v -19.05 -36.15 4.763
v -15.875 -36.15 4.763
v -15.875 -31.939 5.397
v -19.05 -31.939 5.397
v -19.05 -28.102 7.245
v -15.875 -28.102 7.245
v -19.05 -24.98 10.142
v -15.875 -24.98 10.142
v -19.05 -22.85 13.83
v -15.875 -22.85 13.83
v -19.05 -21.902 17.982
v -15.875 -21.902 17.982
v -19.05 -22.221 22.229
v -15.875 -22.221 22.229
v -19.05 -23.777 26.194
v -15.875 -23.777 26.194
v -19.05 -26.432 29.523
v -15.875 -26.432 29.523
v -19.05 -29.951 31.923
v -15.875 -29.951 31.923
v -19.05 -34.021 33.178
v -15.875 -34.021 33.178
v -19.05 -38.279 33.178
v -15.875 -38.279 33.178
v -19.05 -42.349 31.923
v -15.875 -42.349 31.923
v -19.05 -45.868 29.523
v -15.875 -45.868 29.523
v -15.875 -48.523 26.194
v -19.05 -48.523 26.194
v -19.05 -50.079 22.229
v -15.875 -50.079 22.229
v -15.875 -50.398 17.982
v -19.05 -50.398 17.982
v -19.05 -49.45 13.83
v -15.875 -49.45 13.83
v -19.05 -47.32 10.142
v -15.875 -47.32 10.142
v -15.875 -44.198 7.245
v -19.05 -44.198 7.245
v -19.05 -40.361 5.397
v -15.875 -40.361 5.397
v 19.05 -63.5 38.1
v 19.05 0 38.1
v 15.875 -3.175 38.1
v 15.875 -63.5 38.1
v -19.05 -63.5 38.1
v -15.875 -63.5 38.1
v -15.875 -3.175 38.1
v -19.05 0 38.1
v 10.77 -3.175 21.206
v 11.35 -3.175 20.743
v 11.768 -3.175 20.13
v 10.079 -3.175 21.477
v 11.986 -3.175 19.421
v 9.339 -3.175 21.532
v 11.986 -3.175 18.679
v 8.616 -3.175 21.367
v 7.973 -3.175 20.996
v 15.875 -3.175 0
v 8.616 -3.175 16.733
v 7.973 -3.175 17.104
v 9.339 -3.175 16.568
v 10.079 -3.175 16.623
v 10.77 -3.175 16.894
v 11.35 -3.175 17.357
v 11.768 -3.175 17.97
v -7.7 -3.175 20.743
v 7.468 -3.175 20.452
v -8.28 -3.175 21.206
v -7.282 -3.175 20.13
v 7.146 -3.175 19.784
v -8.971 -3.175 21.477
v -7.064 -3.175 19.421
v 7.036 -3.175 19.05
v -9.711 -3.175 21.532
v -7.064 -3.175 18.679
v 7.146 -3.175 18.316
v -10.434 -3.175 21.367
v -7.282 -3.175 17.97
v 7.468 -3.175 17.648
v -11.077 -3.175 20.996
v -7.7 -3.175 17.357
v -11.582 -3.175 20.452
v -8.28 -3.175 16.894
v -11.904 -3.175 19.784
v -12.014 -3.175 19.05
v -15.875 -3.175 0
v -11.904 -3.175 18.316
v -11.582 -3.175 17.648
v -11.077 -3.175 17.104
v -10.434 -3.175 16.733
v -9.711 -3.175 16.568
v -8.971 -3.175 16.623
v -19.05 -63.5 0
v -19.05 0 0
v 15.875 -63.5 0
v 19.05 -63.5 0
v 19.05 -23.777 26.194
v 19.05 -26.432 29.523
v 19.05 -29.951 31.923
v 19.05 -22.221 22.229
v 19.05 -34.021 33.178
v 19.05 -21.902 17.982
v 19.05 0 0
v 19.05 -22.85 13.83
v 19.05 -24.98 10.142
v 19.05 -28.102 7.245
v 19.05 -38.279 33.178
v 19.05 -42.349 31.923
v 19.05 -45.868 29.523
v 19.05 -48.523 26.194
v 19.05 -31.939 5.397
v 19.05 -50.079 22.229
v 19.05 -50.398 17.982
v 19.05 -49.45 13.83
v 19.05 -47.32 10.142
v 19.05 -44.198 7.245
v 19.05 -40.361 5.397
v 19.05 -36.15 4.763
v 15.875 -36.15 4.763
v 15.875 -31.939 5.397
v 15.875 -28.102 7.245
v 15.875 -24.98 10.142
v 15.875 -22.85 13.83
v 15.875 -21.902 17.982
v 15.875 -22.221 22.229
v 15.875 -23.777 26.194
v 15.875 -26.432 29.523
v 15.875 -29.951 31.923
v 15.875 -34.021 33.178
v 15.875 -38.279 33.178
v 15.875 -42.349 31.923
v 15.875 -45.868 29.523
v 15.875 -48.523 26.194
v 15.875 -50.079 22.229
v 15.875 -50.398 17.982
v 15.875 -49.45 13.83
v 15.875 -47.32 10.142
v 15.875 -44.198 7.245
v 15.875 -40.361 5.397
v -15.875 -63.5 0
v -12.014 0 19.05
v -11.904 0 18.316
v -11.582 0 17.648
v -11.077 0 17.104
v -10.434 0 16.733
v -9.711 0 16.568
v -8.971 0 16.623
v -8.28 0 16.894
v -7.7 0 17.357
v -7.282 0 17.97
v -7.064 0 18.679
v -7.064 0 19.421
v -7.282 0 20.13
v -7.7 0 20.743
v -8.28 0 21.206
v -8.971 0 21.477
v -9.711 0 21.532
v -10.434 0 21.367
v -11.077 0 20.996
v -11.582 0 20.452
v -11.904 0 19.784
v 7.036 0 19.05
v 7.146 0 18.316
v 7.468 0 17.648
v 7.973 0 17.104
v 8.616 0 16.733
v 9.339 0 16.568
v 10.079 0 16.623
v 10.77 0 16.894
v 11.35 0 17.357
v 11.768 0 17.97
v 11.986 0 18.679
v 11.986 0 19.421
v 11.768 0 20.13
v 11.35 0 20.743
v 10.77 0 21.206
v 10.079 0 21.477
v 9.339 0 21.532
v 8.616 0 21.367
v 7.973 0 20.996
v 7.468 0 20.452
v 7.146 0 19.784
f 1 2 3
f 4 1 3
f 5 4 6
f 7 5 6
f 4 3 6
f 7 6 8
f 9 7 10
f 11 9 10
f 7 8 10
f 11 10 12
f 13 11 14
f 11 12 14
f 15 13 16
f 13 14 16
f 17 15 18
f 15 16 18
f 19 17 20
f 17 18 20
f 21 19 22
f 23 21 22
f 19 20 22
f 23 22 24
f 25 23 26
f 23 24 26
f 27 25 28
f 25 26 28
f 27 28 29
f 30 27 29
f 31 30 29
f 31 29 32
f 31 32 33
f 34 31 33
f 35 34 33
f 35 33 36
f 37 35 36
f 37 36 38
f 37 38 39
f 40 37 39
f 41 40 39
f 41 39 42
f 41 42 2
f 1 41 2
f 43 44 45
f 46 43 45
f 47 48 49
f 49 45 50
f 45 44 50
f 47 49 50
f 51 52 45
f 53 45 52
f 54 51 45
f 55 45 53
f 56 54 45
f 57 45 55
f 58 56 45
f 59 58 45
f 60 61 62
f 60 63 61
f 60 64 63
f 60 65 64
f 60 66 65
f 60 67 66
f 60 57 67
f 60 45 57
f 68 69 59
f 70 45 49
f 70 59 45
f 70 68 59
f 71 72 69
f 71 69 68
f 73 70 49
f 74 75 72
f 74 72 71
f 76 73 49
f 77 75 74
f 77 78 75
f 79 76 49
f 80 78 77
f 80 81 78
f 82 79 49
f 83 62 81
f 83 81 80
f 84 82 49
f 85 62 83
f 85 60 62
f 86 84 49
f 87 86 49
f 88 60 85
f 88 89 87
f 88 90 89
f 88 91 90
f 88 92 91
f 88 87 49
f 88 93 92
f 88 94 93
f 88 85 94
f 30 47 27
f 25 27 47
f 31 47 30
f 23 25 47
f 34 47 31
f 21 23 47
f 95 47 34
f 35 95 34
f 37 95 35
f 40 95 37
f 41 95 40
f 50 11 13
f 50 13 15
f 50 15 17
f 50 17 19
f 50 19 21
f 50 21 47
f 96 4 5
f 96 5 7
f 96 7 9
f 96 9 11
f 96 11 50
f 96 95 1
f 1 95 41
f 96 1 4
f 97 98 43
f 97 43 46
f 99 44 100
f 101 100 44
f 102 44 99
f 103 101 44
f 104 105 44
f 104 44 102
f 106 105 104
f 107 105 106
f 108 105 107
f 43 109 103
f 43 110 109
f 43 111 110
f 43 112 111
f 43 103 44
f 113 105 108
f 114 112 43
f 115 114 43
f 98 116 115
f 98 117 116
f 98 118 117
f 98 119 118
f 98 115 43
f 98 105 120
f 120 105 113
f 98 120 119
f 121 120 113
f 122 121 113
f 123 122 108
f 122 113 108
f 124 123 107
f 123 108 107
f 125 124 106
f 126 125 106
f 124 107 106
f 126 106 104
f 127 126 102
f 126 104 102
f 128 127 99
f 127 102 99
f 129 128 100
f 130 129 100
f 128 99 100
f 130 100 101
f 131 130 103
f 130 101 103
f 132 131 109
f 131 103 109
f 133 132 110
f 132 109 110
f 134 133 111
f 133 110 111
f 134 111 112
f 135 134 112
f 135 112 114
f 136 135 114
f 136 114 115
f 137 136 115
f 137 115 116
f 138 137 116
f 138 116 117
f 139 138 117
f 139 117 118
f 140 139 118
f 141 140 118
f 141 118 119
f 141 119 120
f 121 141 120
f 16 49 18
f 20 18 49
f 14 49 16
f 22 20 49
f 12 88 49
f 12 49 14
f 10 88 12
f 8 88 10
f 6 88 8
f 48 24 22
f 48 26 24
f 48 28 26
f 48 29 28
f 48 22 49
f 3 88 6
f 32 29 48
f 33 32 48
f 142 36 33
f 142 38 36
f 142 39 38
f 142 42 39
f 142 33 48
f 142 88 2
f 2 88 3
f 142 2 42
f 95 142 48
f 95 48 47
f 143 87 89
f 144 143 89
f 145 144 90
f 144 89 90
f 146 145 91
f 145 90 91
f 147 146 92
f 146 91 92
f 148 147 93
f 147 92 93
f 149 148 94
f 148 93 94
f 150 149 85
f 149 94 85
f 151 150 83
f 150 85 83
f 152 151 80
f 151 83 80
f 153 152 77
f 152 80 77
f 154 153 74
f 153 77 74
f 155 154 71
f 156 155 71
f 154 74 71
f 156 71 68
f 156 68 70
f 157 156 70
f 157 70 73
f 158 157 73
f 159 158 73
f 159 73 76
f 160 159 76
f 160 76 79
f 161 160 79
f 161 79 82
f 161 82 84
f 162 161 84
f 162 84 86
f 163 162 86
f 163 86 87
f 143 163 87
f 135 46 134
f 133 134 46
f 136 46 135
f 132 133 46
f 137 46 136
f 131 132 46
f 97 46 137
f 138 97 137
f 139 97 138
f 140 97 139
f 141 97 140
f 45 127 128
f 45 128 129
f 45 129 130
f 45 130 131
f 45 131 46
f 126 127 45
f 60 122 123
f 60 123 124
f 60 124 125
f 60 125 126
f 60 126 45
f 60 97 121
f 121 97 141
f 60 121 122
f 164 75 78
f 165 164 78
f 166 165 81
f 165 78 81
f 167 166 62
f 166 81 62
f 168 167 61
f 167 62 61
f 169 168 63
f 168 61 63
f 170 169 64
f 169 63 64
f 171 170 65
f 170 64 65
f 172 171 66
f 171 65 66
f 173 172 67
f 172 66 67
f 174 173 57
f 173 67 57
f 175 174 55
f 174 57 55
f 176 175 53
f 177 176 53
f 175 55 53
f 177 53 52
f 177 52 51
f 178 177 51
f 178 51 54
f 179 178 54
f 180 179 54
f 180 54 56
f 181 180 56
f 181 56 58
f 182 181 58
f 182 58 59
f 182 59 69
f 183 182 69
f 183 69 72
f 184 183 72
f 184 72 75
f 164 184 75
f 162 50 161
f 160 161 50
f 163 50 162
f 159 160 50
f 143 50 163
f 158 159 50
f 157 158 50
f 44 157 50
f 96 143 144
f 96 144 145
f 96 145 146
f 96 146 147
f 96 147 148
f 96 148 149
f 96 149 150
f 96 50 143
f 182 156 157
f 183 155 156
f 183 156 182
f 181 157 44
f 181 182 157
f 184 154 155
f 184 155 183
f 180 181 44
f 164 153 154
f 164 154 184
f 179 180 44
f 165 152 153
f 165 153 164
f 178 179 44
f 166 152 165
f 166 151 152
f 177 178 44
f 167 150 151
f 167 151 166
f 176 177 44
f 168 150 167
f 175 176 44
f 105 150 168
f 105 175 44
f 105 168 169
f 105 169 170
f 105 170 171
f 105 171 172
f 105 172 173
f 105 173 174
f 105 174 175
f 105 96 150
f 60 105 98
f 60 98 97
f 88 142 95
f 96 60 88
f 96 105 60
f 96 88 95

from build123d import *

# Parameters (mm, degrees)
BOSS_EXTRUDE1_DEPTH            = 38.1
SKETCH2_R                      = 14.2875
CUT_EXTRUDE1_DEPTH             = 39.1
F_9_0_196_DIAMETER_HOLE1_D     = 4.9784
F_9_0_196_DIAMETER_HOLE1_DEPTH = 3.175


with BuildPart() as part:
    # Sketch1 → Boss-Extrude1 (new body)
    with BuildSketch(Plane.XY):
        Polygon((-19.05, 0), (19.05, 0), (19.05, -63.5), (15.875, -63.5), (15.875, -3.175), (-15.875, -3.175), (-15.875, -63.5), (-19.05, -63.5), align=None)
    extrude(amount=BOSS_EXTRUDE1_DEPTH)

    # Sketch2 → Cut-Extrude1 (cut, through all)
    with BuildSketch(Plane(origin=(19.05, 0, 0), x_dir=(0, 0, -1), z_dir=(1, 0, 0))):
        with Locations((-19.05, -36.1499912)):
            Circle(SKETCH2_R)
    extrude(amount=-CUT_EXTRUDE1_DEPTH, mode=Mode.SUBTRACT)

    # #9 (0.196) Diameter Hole1
    with Locations(Plane(origin=(0, 0, 0), x_dir=(1, 0, 0), z_dir=(0, 1, 0))):
        with Locations((-9.525, -19.05), (9.525, -19.05)):
            Hole(F_9_0_196_DIAMETER_HOLE1_D / 2, depth=F_9_0_196_DIAMETER_HOLE1_DEPTH)


solid = part.part
